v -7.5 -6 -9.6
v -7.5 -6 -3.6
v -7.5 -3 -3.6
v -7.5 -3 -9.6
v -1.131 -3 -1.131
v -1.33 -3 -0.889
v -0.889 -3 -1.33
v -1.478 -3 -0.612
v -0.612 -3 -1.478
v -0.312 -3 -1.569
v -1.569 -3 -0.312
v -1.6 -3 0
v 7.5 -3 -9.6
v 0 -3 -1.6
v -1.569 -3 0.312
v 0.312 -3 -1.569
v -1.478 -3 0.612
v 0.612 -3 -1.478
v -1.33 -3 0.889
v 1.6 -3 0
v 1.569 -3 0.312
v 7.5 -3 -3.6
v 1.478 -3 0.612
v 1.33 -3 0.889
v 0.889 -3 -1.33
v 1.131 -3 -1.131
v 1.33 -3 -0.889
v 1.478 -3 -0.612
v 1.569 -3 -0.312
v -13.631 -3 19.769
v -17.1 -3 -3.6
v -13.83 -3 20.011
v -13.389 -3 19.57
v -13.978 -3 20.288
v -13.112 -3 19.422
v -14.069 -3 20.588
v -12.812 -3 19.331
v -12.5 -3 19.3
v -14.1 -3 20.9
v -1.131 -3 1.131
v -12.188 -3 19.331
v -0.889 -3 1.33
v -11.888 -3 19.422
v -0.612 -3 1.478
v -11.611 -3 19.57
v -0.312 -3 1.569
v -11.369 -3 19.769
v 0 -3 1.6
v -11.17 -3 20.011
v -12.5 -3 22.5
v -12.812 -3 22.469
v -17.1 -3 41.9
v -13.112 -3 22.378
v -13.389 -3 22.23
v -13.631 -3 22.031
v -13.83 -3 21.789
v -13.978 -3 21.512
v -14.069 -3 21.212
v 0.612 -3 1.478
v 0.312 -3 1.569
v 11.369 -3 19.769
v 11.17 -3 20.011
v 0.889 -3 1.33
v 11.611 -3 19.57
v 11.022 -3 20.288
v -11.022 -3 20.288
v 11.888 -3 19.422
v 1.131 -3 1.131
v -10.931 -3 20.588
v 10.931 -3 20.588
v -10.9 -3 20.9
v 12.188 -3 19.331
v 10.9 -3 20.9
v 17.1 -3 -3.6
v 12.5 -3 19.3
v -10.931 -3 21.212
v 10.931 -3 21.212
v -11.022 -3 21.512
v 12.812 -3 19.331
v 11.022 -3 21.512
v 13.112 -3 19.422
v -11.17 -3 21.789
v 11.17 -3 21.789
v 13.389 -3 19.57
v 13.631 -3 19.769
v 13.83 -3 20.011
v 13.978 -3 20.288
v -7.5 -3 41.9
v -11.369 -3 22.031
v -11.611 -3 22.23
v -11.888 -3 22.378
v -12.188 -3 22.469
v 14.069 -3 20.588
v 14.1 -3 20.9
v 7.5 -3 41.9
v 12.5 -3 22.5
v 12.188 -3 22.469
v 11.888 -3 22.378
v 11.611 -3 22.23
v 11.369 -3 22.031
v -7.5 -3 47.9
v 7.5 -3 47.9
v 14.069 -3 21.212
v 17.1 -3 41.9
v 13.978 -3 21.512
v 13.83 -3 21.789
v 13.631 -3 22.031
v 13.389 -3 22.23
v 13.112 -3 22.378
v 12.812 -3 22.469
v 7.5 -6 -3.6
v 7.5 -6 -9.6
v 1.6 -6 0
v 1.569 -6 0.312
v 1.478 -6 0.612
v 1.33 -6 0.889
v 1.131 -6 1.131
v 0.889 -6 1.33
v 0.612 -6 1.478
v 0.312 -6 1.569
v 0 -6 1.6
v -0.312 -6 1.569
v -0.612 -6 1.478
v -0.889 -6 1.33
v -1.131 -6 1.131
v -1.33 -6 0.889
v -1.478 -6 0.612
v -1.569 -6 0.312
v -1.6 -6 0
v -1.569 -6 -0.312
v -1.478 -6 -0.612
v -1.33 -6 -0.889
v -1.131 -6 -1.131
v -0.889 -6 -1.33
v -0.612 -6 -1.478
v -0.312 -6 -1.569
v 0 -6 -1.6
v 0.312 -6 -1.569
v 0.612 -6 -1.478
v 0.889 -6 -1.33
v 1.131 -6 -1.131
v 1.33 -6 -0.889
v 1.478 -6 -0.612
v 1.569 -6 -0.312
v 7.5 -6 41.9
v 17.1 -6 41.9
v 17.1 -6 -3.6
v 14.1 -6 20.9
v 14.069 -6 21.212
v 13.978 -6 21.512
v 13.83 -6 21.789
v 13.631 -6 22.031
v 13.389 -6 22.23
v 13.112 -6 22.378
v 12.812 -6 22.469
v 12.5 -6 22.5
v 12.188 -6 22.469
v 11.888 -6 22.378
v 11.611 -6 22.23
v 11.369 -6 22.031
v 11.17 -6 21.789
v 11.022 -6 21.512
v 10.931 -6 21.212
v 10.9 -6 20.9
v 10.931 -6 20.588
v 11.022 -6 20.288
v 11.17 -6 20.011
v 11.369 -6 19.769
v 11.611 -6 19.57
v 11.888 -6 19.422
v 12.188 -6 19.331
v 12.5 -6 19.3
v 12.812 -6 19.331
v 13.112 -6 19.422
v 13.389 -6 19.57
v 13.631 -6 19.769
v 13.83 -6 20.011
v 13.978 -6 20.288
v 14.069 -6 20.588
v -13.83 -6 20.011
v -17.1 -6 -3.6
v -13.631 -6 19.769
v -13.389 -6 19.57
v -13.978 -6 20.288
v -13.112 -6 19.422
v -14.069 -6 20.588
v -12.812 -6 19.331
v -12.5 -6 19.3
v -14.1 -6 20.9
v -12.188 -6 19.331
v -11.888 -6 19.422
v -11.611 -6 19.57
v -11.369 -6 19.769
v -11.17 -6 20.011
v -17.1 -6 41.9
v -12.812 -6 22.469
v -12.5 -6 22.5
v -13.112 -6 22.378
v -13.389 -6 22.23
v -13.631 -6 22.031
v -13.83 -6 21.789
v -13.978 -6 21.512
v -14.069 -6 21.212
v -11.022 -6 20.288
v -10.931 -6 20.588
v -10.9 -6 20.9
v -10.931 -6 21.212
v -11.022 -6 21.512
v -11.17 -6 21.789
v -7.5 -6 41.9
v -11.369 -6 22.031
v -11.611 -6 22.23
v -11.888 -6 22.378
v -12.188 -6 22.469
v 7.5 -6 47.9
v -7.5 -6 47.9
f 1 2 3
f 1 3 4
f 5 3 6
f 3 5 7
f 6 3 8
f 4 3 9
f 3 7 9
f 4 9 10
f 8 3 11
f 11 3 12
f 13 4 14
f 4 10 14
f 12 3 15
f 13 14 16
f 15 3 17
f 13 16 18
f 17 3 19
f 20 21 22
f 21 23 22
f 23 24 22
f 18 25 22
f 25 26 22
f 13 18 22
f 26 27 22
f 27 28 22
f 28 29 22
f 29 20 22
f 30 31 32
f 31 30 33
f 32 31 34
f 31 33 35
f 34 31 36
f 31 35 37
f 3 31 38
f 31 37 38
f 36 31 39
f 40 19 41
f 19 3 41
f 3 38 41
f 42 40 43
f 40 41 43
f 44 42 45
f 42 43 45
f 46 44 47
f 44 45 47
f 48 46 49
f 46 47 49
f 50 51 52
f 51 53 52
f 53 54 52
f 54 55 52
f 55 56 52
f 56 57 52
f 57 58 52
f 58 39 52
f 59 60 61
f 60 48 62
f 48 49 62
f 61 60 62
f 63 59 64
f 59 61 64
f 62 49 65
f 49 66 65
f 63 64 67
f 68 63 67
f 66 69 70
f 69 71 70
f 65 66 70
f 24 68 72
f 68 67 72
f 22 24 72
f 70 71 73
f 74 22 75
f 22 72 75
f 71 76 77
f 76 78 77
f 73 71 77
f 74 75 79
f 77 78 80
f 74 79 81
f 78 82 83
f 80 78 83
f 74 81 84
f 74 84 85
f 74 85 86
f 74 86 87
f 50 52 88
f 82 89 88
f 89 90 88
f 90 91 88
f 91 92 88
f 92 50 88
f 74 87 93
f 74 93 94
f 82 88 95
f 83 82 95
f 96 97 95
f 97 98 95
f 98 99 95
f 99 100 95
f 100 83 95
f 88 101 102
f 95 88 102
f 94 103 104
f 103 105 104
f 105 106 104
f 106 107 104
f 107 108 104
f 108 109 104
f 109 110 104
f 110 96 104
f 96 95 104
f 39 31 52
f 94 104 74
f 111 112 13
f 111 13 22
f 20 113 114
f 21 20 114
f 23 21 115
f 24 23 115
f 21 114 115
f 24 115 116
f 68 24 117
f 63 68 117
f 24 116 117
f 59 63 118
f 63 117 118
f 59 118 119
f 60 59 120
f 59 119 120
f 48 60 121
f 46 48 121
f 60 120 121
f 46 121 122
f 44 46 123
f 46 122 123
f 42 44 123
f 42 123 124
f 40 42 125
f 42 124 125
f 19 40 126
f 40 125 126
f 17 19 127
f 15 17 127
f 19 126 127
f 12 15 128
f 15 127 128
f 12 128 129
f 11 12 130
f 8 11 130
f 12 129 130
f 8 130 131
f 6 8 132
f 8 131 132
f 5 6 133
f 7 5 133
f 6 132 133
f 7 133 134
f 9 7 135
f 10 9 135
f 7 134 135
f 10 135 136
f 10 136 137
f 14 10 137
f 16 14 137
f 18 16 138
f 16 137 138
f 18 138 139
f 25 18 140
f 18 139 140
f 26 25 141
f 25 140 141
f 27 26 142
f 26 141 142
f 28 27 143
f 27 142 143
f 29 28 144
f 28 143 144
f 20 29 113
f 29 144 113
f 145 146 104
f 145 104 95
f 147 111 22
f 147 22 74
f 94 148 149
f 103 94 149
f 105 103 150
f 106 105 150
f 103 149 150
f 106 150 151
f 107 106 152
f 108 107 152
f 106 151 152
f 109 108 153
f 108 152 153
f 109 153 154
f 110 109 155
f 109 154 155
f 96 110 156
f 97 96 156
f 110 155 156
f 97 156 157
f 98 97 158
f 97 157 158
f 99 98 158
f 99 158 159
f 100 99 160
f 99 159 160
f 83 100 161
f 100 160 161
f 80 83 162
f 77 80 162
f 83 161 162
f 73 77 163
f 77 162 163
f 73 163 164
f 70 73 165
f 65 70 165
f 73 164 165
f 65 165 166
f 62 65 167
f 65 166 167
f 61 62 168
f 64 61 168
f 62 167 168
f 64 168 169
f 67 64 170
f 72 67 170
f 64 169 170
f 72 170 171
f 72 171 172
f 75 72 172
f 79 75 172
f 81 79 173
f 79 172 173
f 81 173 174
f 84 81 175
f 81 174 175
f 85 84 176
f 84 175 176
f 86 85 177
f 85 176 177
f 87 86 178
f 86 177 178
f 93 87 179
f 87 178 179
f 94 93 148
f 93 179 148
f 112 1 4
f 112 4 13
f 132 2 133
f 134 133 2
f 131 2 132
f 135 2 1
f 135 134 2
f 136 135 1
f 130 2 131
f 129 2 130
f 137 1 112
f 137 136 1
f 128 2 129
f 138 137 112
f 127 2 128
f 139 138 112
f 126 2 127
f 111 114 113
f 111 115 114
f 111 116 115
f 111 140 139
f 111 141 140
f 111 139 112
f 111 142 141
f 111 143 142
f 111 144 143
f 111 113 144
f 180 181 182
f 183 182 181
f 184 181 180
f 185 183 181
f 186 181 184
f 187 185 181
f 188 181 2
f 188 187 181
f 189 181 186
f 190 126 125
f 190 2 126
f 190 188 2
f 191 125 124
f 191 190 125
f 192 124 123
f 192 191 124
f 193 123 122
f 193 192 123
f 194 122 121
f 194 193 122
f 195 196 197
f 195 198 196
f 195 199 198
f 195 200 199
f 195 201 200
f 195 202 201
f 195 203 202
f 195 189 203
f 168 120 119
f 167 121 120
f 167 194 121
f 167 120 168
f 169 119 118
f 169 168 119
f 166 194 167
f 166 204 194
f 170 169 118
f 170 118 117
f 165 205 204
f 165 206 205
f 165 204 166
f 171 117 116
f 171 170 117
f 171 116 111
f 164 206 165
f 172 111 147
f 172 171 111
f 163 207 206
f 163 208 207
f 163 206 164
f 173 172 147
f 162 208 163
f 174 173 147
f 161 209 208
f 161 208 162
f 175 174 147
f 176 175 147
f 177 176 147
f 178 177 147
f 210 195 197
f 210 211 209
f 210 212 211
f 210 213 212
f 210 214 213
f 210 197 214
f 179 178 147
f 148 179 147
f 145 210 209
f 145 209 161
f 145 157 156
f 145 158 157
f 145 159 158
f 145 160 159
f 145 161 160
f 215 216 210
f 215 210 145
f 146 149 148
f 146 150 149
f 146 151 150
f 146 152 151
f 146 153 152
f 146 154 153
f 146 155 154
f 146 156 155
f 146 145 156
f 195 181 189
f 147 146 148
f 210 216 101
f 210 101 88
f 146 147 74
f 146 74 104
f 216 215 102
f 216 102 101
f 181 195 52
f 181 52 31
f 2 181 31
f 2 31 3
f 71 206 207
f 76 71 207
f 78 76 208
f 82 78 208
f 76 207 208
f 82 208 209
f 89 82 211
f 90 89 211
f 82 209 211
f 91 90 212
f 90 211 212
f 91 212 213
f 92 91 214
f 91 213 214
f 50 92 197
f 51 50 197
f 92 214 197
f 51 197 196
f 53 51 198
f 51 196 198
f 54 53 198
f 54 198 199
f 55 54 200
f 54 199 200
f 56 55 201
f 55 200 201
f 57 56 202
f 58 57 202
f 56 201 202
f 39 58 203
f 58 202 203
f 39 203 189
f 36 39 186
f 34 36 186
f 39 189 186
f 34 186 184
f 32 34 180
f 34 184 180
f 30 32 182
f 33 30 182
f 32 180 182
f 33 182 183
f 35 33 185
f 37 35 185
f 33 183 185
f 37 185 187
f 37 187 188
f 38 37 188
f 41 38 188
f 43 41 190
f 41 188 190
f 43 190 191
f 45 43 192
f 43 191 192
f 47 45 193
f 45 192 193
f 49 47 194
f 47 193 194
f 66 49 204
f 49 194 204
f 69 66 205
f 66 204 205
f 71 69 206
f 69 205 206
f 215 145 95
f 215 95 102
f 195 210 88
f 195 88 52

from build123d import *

# Parameters (mm, degrees)
ESBO_O1_R                = 1.6
RESSALTO_EXTRUS_O1_DEPTH = 3


with BuildPart() as part:
    # Esboço1 → Ressalto-extrusão1 (new body)
    with BuildSketch(Plane.XZ.offset(6)):
        Polygon((17.1, 41.9), (7.5, 41.9), (7.5, 47.9), (-7.5, 47.9), (-7.5, 41.9), (-17.1, 41.9), (-17.1, -3.6), (-7.5, -3.6), (-7.5, -9.6), (7.5, -9.6), (7.5, -3.6), (17.1, -3.6), align=None)
        with Locations((-12.5, 20.9)):
            Circle(ESBO_O1_R, mode=Mode.SUBTRACT)
        Circle(ESBO_O1_R, mode=Mode.SUBTRACT)
        with Locations((12.5, 20.9)):
            Circle(ESBO_O1_R, mode=Mode.SUBTRACT)
    extrude(amount=-RESSALTO_EXTRUS_O1_DEPTH)


solid = part.part
